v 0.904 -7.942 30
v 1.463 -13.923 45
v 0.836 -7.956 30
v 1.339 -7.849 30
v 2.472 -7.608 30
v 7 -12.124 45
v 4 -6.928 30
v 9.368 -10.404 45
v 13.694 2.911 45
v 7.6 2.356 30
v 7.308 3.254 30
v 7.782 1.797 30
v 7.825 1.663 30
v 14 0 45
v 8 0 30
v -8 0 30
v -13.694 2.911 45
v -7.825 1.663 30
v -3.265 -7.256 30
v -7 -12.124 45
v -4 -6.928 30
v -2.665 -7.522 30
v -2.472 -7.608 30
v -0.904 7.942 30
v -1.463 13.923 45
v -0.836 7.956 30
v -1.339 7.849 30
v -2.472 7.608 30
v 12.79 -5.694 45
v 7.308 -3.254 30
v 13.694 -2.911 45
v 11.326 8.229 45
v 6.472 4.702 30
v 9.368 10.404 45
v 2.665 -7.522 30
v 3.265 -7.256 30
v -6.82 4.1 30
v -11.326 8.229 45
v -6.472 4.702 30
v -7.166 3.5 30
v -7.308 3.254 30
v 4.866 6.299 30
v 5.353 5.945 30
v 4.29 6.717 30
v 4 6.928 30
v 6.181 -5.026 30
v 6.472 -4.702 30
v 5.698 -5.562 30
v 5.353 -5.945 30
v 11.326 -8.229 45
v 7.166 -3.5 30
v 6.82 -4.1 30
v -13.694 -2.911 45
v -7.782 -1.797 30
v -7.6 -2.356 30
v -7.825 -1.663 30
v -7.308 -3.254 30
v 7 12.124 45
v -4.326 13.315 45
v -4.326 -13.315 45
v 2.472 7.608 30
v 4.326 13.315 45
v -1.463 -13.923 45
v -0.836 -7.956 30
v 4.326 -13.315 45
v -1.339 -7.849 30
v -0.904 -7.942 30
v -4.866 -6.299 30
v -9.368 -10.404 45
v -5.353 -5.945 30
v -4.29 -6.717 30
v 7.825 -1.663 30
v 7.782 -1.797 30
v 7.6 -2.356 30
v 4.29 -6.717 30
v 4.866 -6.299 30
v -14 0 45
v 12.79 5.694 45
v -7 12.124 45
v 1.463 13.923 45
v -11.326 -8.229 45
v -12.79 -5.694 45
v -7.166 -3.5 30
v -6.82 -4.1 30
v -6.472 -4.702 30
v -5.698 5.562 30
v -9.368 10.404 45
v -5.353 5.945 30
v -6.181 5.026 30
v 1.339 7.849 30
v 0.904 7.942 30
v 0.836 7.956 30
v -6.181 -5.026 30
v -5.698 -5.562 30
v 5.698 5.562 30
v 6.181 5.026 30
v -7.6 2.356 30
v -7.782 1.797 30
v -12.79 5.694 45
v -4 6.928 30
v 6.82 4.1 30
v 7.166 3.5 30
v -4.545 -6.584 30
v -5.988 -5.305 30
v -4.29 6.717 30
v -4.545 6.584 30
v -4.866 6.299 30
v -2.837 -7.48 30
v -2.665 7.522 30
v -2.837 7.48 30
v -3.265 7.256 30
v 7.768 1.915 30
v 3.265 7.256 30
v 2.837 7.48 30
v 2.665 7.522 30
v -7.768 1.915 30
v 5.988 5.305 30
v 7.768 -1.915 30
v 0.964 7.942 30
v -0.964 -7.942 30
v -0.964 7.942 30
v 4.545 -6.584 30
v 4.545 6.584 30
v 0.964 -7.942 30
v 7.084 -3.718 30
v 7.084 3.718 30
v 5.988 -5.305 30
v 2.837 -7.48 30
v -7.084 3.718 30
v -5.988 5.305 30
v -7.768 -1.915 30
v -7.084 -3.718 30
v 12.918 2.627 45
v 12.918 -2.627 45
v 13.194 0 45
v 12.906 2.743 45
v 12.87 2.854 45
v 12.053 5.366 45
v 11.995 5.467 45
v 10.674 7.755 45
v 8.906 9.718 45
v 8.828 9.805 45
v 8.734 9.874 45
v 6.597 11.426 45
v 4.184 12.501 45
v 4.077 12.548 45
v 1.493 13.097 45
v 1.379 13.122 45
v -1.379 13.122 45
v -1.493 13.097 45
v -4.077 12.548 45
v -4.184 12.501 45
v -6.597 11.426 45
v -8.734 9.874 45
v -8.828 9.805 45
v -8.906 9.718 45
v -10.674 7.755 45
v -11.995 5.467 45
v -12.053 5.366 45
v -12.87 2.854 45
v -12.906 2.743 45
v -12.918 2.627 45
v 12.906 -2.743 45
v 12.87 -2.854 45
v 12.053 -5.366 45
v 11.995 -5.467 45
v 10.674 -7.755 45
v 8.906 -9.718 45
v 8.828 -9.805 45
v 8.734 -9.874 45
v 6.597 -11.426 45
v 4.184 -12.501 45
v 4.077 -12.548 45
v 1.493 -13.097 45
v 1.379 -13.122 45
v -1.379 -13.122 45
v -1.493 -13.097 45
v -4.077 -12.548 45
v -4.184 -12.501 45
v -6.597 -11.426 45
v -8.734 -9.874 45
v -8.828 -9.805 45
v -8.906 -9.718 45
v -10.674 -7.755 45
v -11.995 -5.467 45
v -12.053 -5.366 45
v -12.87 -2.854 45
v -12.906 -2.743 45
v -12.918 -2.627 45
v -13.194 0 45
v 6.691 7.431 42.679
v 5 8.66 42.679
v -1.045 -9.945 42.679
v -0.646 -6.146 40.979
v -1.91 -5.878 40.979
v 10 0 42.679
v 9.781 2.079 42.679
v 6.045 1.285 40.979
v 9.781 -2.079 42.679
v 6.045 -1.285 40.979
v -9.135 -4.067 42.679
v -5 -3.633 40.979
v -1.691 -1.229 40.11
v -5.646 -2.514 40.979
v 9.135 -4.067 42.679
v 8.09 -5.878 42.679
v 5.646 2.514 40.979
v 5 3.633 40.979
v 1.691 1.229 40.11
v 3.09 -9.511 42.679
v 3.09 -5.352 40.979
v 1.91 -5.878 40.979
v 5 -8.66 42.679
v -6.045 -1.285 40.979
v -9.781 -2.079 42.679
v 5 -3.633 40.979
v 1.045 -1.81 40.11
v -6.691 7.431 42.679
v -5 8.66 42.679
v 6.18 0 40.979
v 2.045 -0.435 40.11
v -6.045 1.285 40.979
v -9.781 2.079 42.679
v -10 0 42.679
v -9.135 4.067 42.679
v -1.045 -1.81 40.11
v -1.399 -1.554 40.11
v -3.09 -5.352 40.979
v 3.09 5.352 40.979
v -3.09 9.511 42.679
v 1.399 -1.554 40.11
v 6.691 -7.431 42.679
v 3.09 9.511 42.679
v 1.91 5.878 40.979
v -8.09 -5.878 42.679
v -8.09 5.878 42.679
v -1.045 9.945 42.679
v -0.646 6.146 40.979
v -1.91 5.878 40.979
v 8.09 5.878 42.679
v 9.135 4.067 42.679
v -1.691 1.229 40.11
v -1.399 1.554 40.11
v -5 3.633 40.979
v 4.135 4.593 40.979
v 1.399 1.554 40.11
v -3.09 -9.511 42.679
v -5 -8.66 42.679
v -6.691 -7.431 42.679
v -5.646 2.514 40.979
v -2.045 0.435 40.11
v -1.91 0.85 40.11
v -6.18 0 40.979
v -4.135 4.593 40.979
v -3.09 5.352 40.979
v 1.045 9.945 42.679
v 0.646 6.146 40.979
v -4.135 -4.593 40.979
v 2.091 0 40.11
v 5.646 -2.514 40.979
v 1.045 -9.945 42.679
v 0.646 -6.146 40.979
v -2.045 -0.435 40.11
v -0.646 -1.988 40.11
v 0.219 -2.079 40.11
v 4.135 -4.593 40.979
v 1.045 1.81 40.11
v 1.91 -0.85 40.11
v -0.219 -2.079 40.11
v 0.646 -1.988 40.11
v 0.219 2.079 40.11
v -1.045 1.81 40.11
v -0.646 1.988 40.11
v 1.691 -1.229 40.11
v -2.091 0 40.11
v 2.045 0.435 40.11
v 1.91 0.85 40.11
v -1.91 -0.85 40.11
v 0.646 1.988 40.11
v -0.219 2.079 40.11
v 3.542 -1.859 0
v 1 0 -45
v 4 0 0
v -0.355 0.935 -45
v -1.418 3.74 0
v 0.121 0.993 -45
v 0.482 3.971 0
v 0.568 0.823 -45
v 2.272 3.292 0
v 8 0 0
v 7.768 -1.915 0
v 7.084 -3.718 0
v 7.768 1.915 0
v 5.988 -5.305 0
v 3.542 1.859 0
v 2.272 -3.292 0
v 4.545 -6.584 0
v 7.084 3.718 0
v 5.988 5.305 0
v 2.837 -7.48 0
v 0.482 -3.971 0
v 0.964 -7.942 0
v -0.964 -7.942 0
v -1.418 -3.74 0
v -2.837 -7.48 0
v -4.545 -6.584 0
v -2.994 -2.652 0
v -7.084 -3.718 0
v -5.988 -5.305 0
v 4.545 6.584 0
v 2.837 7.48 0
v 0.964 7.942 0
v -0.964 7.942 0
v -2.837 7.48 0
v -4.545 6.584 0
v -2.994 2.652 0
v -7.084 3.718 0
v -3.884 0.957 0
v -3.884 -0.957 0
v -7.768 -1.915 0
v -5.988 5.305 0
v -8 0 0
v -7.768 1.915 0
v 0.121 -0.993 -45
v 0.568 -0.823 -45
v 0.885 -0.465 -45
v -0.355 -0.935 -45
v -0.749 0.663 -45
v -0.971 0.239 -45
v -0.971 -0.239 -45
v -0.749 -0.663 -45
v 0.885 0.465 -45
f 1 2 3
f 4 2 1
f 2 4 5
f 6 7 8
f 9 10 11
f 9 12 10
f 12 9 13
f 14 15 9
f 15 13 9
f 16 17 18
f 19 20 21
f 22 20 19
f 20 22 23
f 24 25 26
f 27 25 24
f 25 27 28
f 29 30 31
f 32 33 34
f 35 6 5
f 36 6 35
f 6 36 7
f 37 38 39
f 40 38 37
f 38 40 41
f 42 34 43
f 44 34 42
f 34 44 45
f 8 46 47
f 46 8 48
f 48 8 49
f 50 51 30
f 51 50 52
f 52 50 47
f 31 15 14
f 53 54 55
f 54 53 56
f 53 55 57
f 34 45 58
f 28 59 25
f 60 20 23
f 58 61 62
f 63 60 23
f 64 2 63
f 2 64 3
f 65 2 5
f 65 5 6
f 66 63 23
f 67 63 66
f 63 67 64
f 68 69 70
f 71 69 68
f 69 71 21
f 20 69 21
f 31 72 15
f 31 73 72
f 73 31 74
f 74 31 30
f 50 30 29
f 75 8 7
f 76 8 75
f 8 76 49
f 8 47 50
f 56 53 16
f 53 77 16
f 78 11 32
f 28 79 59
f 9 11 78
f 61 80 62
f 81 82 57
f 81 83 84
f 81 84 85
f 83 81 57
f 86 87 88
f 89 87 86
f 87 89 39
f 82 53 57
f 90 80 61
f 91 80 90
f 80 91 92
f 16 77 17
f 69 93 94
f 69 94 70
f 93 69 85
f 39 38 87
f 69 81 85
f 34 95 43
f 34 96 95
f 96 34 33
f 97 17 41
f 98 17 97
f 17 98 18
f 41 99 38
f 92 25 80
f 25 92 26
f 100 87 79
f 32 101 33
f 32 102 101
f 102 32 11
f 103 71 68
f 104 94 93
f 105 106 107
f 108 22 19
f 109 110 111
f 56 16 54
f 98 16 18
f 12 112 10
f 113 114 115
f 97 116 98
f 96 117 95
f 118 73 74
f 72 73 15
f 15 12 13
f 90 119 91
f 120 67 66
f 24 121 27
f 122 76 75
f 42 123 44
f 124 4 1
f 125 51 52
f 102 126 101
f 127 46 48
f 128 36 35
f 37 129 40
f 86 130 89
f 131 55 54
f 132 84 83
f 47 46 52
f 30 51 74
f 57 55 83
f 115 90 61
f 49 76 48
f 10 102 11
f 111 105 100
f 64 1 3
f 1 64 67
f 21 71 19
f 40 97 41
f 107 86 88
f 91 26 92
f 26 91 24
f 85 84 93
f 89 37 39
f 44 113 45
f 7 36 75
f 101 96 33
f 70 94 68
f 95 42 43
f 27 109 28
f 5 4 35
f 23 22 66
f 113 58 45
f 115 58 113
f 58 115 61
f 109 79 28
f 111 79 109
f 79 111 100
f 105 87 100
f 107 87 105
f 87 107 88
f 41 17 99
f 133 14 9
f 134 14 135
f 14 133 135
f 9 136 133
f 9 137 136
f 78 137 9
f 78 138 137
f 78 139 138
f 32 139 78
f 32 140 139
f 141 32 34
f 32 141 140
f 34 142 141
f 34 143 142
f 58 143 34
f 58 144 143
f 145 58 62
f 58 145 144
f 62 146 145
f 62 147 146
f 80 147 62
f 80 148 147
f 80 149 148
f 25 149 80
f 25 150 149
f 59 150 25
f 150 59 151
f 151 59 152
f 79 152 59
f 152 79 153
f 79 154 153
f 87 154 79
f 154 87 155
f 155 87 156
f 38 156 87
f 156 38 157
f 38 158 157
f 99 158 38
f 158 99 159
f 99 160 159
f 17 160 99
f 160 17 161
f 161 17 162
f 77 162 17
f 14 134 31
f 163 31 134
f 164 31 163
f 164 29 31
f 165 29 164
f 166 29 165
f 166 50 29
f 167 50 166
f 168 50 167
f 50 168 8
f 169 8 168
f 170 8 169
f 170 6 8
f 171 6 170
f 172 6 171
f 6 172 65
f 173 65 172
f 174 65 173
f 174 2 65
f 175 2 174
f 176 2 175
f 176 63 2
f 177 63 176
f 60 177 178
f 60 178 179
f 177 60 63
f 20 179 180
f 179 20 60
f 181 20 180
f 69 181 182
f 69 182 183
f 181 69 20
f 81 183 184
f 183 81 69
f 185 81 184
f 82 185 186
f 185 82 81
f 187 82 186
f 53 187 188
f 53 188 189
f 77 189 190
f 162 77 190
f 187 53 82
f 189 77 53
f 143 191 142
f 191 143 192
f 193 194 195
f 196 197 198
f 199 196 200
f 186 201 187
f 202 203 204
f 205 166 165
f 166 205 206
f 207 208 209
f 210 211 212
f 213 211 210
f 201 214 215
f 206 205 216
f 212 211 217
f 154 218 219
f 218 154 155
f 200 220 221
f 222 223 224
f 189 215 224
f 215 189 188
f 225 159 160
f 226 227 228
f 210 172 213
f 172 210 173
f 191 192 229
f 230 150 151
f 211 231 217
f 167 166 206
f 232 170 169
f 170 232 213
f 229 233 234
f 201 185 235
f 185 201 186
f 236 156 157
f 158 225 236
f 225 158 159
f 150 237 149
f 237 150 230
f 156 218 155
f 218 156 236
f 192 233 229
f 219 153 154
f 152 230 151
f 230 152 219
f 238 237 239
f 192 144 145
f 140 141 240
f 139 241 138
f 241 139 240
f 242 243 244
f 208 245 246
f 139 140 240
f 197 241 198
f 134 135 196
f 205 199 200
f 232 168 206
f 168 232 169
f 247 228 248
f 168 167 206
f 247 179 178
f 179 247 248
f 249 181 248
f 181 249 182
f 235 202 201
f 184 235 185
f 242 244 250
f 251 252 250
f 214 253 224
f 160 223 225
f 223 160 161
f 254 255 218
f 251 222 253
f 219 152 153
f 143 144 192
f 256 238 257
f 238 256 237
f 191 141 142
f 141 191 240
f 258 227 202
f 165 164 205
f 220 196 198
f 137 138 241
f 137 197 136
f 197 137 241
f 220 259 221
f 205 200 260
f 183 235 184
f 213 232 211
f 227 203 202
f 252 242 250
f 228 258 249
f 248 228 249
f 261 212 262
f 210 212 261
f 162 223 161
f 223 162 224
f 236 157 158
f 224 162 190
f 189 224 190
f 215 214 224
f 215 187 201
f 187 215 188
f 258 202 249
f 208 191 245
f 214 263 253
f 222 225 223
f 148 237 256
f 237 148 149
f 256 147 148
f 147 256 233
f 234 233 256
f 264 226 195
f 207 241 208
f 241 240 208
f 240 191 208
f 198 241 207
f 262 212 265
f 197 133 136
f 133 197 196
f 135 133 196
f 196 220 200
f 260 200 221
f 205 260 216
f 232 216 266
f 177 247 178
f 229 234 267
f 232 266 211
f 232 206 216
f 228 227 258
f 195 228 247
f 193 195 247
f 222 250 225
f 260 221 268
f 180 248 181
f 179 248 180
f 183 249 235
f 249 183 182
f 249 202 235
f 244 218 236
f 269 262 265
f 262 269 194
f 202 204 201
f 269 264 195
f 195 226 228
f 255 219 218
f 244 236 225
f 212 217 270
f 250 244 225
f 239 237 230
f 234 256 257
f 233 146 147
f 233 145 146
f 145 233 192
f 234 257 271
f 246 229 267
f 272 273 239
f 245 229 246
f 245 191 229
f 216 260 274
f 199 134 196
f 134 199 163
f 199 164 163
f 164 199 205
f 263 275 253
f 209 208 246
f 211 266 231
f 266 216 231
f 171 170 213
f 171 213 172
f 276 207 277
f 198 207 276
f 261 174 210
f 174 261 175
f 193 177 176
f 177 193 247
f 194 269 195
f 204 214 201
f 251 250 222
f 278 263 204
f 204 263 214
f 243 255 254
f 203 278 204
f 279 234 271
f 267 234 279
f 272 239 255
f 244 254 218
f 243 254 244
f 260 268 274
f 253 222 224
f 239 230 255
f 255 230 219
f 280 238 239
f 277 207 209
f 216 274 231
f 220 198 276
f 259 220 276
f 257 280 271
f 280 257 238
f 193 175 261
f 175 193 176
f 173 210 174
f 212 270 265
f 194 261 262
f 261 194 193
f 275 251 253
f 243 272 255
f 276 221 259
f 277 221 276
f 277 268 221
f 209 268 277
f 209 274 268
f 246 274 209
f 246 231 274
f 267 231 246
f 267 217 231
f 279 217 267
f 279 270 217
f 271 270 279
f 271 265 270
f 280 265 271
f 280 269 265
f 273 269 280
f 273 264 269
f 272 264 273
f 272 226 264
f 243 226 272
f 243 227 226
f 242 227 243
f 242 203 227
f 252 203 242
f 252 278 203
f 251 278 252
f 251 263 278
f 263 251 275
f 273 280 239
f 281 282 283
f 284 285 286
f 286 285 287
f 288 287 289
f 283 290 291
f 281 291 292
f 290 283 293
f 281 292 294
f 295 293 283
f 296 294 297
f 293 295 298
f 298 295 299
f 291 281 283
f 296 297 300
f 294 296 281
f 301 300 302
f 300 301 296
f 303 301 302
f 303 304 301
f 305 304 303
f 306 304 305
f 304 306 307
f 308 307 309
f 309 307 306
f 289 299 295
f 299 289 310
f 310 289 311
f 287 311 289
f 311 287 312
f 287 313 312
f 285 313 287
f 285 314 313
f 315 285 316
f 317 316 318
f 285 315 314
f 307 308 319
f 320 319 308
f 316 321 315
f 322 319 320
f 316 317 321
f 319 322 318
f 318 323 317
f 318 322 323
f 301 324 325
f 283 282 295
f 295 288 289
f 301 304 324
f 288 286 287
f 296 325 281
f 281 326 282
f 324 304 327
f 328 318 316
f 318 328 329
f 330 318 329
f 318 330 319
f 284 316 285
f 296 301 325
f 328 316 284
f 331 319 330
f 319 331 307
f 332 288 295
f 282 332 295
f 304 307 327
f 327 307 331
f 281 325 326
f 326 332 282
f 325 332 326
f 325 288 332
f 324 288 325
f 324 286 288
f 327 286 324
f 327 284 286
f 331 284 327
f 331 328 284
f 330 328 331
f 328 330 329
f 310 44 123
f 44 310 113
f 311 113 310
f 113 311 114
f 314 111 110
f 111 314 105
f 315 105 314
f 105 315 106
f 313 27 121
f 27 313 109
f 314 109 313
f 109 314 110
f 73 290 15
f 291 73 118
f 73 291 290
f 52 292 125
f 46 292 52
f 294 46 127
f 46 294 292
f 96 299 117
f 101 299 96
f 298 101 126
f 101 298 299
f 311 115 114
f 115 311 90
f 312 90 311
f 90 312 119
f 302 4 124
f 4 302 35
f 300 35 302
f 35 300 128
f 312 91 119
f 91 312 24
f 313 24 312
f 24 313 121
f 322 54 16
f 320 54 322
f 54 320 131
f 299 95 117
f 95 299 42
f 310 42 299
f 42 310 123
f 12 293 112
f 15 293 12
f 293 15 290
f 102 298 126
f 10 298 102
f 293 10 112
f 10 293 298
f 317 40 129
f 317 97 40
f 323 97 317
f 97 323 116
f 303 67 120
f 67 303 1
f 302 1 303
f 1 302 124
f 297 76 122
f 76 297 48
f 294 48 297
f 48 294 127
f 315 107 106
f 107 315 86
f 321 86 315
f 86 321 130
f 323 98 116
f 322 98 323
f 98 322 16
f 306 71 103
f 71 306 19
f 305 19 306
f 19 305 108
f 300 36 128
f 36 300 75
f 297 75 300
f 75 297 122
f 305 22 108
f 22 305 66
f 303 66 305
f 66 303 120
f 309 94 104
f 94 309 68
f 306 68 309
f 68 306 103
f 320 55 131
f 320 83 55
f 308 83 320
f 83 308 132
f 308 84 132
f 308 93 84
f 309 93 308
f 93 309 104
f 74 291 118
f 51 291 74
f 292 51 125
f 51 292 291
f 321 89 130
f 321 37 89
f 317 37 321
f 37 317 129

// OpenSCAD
rotate([180, 0, 0]){
    cylinder(h=45,r1=4,r2=1);
}
cylinder(h=30,r=8);
translate([0,0,30]){
    difference(){
        cylinder(h=15,r1=8,r2=14);
        translate([0,0,(40/2+10)]){
            sphere(r=40/2);
        }
    }
}
